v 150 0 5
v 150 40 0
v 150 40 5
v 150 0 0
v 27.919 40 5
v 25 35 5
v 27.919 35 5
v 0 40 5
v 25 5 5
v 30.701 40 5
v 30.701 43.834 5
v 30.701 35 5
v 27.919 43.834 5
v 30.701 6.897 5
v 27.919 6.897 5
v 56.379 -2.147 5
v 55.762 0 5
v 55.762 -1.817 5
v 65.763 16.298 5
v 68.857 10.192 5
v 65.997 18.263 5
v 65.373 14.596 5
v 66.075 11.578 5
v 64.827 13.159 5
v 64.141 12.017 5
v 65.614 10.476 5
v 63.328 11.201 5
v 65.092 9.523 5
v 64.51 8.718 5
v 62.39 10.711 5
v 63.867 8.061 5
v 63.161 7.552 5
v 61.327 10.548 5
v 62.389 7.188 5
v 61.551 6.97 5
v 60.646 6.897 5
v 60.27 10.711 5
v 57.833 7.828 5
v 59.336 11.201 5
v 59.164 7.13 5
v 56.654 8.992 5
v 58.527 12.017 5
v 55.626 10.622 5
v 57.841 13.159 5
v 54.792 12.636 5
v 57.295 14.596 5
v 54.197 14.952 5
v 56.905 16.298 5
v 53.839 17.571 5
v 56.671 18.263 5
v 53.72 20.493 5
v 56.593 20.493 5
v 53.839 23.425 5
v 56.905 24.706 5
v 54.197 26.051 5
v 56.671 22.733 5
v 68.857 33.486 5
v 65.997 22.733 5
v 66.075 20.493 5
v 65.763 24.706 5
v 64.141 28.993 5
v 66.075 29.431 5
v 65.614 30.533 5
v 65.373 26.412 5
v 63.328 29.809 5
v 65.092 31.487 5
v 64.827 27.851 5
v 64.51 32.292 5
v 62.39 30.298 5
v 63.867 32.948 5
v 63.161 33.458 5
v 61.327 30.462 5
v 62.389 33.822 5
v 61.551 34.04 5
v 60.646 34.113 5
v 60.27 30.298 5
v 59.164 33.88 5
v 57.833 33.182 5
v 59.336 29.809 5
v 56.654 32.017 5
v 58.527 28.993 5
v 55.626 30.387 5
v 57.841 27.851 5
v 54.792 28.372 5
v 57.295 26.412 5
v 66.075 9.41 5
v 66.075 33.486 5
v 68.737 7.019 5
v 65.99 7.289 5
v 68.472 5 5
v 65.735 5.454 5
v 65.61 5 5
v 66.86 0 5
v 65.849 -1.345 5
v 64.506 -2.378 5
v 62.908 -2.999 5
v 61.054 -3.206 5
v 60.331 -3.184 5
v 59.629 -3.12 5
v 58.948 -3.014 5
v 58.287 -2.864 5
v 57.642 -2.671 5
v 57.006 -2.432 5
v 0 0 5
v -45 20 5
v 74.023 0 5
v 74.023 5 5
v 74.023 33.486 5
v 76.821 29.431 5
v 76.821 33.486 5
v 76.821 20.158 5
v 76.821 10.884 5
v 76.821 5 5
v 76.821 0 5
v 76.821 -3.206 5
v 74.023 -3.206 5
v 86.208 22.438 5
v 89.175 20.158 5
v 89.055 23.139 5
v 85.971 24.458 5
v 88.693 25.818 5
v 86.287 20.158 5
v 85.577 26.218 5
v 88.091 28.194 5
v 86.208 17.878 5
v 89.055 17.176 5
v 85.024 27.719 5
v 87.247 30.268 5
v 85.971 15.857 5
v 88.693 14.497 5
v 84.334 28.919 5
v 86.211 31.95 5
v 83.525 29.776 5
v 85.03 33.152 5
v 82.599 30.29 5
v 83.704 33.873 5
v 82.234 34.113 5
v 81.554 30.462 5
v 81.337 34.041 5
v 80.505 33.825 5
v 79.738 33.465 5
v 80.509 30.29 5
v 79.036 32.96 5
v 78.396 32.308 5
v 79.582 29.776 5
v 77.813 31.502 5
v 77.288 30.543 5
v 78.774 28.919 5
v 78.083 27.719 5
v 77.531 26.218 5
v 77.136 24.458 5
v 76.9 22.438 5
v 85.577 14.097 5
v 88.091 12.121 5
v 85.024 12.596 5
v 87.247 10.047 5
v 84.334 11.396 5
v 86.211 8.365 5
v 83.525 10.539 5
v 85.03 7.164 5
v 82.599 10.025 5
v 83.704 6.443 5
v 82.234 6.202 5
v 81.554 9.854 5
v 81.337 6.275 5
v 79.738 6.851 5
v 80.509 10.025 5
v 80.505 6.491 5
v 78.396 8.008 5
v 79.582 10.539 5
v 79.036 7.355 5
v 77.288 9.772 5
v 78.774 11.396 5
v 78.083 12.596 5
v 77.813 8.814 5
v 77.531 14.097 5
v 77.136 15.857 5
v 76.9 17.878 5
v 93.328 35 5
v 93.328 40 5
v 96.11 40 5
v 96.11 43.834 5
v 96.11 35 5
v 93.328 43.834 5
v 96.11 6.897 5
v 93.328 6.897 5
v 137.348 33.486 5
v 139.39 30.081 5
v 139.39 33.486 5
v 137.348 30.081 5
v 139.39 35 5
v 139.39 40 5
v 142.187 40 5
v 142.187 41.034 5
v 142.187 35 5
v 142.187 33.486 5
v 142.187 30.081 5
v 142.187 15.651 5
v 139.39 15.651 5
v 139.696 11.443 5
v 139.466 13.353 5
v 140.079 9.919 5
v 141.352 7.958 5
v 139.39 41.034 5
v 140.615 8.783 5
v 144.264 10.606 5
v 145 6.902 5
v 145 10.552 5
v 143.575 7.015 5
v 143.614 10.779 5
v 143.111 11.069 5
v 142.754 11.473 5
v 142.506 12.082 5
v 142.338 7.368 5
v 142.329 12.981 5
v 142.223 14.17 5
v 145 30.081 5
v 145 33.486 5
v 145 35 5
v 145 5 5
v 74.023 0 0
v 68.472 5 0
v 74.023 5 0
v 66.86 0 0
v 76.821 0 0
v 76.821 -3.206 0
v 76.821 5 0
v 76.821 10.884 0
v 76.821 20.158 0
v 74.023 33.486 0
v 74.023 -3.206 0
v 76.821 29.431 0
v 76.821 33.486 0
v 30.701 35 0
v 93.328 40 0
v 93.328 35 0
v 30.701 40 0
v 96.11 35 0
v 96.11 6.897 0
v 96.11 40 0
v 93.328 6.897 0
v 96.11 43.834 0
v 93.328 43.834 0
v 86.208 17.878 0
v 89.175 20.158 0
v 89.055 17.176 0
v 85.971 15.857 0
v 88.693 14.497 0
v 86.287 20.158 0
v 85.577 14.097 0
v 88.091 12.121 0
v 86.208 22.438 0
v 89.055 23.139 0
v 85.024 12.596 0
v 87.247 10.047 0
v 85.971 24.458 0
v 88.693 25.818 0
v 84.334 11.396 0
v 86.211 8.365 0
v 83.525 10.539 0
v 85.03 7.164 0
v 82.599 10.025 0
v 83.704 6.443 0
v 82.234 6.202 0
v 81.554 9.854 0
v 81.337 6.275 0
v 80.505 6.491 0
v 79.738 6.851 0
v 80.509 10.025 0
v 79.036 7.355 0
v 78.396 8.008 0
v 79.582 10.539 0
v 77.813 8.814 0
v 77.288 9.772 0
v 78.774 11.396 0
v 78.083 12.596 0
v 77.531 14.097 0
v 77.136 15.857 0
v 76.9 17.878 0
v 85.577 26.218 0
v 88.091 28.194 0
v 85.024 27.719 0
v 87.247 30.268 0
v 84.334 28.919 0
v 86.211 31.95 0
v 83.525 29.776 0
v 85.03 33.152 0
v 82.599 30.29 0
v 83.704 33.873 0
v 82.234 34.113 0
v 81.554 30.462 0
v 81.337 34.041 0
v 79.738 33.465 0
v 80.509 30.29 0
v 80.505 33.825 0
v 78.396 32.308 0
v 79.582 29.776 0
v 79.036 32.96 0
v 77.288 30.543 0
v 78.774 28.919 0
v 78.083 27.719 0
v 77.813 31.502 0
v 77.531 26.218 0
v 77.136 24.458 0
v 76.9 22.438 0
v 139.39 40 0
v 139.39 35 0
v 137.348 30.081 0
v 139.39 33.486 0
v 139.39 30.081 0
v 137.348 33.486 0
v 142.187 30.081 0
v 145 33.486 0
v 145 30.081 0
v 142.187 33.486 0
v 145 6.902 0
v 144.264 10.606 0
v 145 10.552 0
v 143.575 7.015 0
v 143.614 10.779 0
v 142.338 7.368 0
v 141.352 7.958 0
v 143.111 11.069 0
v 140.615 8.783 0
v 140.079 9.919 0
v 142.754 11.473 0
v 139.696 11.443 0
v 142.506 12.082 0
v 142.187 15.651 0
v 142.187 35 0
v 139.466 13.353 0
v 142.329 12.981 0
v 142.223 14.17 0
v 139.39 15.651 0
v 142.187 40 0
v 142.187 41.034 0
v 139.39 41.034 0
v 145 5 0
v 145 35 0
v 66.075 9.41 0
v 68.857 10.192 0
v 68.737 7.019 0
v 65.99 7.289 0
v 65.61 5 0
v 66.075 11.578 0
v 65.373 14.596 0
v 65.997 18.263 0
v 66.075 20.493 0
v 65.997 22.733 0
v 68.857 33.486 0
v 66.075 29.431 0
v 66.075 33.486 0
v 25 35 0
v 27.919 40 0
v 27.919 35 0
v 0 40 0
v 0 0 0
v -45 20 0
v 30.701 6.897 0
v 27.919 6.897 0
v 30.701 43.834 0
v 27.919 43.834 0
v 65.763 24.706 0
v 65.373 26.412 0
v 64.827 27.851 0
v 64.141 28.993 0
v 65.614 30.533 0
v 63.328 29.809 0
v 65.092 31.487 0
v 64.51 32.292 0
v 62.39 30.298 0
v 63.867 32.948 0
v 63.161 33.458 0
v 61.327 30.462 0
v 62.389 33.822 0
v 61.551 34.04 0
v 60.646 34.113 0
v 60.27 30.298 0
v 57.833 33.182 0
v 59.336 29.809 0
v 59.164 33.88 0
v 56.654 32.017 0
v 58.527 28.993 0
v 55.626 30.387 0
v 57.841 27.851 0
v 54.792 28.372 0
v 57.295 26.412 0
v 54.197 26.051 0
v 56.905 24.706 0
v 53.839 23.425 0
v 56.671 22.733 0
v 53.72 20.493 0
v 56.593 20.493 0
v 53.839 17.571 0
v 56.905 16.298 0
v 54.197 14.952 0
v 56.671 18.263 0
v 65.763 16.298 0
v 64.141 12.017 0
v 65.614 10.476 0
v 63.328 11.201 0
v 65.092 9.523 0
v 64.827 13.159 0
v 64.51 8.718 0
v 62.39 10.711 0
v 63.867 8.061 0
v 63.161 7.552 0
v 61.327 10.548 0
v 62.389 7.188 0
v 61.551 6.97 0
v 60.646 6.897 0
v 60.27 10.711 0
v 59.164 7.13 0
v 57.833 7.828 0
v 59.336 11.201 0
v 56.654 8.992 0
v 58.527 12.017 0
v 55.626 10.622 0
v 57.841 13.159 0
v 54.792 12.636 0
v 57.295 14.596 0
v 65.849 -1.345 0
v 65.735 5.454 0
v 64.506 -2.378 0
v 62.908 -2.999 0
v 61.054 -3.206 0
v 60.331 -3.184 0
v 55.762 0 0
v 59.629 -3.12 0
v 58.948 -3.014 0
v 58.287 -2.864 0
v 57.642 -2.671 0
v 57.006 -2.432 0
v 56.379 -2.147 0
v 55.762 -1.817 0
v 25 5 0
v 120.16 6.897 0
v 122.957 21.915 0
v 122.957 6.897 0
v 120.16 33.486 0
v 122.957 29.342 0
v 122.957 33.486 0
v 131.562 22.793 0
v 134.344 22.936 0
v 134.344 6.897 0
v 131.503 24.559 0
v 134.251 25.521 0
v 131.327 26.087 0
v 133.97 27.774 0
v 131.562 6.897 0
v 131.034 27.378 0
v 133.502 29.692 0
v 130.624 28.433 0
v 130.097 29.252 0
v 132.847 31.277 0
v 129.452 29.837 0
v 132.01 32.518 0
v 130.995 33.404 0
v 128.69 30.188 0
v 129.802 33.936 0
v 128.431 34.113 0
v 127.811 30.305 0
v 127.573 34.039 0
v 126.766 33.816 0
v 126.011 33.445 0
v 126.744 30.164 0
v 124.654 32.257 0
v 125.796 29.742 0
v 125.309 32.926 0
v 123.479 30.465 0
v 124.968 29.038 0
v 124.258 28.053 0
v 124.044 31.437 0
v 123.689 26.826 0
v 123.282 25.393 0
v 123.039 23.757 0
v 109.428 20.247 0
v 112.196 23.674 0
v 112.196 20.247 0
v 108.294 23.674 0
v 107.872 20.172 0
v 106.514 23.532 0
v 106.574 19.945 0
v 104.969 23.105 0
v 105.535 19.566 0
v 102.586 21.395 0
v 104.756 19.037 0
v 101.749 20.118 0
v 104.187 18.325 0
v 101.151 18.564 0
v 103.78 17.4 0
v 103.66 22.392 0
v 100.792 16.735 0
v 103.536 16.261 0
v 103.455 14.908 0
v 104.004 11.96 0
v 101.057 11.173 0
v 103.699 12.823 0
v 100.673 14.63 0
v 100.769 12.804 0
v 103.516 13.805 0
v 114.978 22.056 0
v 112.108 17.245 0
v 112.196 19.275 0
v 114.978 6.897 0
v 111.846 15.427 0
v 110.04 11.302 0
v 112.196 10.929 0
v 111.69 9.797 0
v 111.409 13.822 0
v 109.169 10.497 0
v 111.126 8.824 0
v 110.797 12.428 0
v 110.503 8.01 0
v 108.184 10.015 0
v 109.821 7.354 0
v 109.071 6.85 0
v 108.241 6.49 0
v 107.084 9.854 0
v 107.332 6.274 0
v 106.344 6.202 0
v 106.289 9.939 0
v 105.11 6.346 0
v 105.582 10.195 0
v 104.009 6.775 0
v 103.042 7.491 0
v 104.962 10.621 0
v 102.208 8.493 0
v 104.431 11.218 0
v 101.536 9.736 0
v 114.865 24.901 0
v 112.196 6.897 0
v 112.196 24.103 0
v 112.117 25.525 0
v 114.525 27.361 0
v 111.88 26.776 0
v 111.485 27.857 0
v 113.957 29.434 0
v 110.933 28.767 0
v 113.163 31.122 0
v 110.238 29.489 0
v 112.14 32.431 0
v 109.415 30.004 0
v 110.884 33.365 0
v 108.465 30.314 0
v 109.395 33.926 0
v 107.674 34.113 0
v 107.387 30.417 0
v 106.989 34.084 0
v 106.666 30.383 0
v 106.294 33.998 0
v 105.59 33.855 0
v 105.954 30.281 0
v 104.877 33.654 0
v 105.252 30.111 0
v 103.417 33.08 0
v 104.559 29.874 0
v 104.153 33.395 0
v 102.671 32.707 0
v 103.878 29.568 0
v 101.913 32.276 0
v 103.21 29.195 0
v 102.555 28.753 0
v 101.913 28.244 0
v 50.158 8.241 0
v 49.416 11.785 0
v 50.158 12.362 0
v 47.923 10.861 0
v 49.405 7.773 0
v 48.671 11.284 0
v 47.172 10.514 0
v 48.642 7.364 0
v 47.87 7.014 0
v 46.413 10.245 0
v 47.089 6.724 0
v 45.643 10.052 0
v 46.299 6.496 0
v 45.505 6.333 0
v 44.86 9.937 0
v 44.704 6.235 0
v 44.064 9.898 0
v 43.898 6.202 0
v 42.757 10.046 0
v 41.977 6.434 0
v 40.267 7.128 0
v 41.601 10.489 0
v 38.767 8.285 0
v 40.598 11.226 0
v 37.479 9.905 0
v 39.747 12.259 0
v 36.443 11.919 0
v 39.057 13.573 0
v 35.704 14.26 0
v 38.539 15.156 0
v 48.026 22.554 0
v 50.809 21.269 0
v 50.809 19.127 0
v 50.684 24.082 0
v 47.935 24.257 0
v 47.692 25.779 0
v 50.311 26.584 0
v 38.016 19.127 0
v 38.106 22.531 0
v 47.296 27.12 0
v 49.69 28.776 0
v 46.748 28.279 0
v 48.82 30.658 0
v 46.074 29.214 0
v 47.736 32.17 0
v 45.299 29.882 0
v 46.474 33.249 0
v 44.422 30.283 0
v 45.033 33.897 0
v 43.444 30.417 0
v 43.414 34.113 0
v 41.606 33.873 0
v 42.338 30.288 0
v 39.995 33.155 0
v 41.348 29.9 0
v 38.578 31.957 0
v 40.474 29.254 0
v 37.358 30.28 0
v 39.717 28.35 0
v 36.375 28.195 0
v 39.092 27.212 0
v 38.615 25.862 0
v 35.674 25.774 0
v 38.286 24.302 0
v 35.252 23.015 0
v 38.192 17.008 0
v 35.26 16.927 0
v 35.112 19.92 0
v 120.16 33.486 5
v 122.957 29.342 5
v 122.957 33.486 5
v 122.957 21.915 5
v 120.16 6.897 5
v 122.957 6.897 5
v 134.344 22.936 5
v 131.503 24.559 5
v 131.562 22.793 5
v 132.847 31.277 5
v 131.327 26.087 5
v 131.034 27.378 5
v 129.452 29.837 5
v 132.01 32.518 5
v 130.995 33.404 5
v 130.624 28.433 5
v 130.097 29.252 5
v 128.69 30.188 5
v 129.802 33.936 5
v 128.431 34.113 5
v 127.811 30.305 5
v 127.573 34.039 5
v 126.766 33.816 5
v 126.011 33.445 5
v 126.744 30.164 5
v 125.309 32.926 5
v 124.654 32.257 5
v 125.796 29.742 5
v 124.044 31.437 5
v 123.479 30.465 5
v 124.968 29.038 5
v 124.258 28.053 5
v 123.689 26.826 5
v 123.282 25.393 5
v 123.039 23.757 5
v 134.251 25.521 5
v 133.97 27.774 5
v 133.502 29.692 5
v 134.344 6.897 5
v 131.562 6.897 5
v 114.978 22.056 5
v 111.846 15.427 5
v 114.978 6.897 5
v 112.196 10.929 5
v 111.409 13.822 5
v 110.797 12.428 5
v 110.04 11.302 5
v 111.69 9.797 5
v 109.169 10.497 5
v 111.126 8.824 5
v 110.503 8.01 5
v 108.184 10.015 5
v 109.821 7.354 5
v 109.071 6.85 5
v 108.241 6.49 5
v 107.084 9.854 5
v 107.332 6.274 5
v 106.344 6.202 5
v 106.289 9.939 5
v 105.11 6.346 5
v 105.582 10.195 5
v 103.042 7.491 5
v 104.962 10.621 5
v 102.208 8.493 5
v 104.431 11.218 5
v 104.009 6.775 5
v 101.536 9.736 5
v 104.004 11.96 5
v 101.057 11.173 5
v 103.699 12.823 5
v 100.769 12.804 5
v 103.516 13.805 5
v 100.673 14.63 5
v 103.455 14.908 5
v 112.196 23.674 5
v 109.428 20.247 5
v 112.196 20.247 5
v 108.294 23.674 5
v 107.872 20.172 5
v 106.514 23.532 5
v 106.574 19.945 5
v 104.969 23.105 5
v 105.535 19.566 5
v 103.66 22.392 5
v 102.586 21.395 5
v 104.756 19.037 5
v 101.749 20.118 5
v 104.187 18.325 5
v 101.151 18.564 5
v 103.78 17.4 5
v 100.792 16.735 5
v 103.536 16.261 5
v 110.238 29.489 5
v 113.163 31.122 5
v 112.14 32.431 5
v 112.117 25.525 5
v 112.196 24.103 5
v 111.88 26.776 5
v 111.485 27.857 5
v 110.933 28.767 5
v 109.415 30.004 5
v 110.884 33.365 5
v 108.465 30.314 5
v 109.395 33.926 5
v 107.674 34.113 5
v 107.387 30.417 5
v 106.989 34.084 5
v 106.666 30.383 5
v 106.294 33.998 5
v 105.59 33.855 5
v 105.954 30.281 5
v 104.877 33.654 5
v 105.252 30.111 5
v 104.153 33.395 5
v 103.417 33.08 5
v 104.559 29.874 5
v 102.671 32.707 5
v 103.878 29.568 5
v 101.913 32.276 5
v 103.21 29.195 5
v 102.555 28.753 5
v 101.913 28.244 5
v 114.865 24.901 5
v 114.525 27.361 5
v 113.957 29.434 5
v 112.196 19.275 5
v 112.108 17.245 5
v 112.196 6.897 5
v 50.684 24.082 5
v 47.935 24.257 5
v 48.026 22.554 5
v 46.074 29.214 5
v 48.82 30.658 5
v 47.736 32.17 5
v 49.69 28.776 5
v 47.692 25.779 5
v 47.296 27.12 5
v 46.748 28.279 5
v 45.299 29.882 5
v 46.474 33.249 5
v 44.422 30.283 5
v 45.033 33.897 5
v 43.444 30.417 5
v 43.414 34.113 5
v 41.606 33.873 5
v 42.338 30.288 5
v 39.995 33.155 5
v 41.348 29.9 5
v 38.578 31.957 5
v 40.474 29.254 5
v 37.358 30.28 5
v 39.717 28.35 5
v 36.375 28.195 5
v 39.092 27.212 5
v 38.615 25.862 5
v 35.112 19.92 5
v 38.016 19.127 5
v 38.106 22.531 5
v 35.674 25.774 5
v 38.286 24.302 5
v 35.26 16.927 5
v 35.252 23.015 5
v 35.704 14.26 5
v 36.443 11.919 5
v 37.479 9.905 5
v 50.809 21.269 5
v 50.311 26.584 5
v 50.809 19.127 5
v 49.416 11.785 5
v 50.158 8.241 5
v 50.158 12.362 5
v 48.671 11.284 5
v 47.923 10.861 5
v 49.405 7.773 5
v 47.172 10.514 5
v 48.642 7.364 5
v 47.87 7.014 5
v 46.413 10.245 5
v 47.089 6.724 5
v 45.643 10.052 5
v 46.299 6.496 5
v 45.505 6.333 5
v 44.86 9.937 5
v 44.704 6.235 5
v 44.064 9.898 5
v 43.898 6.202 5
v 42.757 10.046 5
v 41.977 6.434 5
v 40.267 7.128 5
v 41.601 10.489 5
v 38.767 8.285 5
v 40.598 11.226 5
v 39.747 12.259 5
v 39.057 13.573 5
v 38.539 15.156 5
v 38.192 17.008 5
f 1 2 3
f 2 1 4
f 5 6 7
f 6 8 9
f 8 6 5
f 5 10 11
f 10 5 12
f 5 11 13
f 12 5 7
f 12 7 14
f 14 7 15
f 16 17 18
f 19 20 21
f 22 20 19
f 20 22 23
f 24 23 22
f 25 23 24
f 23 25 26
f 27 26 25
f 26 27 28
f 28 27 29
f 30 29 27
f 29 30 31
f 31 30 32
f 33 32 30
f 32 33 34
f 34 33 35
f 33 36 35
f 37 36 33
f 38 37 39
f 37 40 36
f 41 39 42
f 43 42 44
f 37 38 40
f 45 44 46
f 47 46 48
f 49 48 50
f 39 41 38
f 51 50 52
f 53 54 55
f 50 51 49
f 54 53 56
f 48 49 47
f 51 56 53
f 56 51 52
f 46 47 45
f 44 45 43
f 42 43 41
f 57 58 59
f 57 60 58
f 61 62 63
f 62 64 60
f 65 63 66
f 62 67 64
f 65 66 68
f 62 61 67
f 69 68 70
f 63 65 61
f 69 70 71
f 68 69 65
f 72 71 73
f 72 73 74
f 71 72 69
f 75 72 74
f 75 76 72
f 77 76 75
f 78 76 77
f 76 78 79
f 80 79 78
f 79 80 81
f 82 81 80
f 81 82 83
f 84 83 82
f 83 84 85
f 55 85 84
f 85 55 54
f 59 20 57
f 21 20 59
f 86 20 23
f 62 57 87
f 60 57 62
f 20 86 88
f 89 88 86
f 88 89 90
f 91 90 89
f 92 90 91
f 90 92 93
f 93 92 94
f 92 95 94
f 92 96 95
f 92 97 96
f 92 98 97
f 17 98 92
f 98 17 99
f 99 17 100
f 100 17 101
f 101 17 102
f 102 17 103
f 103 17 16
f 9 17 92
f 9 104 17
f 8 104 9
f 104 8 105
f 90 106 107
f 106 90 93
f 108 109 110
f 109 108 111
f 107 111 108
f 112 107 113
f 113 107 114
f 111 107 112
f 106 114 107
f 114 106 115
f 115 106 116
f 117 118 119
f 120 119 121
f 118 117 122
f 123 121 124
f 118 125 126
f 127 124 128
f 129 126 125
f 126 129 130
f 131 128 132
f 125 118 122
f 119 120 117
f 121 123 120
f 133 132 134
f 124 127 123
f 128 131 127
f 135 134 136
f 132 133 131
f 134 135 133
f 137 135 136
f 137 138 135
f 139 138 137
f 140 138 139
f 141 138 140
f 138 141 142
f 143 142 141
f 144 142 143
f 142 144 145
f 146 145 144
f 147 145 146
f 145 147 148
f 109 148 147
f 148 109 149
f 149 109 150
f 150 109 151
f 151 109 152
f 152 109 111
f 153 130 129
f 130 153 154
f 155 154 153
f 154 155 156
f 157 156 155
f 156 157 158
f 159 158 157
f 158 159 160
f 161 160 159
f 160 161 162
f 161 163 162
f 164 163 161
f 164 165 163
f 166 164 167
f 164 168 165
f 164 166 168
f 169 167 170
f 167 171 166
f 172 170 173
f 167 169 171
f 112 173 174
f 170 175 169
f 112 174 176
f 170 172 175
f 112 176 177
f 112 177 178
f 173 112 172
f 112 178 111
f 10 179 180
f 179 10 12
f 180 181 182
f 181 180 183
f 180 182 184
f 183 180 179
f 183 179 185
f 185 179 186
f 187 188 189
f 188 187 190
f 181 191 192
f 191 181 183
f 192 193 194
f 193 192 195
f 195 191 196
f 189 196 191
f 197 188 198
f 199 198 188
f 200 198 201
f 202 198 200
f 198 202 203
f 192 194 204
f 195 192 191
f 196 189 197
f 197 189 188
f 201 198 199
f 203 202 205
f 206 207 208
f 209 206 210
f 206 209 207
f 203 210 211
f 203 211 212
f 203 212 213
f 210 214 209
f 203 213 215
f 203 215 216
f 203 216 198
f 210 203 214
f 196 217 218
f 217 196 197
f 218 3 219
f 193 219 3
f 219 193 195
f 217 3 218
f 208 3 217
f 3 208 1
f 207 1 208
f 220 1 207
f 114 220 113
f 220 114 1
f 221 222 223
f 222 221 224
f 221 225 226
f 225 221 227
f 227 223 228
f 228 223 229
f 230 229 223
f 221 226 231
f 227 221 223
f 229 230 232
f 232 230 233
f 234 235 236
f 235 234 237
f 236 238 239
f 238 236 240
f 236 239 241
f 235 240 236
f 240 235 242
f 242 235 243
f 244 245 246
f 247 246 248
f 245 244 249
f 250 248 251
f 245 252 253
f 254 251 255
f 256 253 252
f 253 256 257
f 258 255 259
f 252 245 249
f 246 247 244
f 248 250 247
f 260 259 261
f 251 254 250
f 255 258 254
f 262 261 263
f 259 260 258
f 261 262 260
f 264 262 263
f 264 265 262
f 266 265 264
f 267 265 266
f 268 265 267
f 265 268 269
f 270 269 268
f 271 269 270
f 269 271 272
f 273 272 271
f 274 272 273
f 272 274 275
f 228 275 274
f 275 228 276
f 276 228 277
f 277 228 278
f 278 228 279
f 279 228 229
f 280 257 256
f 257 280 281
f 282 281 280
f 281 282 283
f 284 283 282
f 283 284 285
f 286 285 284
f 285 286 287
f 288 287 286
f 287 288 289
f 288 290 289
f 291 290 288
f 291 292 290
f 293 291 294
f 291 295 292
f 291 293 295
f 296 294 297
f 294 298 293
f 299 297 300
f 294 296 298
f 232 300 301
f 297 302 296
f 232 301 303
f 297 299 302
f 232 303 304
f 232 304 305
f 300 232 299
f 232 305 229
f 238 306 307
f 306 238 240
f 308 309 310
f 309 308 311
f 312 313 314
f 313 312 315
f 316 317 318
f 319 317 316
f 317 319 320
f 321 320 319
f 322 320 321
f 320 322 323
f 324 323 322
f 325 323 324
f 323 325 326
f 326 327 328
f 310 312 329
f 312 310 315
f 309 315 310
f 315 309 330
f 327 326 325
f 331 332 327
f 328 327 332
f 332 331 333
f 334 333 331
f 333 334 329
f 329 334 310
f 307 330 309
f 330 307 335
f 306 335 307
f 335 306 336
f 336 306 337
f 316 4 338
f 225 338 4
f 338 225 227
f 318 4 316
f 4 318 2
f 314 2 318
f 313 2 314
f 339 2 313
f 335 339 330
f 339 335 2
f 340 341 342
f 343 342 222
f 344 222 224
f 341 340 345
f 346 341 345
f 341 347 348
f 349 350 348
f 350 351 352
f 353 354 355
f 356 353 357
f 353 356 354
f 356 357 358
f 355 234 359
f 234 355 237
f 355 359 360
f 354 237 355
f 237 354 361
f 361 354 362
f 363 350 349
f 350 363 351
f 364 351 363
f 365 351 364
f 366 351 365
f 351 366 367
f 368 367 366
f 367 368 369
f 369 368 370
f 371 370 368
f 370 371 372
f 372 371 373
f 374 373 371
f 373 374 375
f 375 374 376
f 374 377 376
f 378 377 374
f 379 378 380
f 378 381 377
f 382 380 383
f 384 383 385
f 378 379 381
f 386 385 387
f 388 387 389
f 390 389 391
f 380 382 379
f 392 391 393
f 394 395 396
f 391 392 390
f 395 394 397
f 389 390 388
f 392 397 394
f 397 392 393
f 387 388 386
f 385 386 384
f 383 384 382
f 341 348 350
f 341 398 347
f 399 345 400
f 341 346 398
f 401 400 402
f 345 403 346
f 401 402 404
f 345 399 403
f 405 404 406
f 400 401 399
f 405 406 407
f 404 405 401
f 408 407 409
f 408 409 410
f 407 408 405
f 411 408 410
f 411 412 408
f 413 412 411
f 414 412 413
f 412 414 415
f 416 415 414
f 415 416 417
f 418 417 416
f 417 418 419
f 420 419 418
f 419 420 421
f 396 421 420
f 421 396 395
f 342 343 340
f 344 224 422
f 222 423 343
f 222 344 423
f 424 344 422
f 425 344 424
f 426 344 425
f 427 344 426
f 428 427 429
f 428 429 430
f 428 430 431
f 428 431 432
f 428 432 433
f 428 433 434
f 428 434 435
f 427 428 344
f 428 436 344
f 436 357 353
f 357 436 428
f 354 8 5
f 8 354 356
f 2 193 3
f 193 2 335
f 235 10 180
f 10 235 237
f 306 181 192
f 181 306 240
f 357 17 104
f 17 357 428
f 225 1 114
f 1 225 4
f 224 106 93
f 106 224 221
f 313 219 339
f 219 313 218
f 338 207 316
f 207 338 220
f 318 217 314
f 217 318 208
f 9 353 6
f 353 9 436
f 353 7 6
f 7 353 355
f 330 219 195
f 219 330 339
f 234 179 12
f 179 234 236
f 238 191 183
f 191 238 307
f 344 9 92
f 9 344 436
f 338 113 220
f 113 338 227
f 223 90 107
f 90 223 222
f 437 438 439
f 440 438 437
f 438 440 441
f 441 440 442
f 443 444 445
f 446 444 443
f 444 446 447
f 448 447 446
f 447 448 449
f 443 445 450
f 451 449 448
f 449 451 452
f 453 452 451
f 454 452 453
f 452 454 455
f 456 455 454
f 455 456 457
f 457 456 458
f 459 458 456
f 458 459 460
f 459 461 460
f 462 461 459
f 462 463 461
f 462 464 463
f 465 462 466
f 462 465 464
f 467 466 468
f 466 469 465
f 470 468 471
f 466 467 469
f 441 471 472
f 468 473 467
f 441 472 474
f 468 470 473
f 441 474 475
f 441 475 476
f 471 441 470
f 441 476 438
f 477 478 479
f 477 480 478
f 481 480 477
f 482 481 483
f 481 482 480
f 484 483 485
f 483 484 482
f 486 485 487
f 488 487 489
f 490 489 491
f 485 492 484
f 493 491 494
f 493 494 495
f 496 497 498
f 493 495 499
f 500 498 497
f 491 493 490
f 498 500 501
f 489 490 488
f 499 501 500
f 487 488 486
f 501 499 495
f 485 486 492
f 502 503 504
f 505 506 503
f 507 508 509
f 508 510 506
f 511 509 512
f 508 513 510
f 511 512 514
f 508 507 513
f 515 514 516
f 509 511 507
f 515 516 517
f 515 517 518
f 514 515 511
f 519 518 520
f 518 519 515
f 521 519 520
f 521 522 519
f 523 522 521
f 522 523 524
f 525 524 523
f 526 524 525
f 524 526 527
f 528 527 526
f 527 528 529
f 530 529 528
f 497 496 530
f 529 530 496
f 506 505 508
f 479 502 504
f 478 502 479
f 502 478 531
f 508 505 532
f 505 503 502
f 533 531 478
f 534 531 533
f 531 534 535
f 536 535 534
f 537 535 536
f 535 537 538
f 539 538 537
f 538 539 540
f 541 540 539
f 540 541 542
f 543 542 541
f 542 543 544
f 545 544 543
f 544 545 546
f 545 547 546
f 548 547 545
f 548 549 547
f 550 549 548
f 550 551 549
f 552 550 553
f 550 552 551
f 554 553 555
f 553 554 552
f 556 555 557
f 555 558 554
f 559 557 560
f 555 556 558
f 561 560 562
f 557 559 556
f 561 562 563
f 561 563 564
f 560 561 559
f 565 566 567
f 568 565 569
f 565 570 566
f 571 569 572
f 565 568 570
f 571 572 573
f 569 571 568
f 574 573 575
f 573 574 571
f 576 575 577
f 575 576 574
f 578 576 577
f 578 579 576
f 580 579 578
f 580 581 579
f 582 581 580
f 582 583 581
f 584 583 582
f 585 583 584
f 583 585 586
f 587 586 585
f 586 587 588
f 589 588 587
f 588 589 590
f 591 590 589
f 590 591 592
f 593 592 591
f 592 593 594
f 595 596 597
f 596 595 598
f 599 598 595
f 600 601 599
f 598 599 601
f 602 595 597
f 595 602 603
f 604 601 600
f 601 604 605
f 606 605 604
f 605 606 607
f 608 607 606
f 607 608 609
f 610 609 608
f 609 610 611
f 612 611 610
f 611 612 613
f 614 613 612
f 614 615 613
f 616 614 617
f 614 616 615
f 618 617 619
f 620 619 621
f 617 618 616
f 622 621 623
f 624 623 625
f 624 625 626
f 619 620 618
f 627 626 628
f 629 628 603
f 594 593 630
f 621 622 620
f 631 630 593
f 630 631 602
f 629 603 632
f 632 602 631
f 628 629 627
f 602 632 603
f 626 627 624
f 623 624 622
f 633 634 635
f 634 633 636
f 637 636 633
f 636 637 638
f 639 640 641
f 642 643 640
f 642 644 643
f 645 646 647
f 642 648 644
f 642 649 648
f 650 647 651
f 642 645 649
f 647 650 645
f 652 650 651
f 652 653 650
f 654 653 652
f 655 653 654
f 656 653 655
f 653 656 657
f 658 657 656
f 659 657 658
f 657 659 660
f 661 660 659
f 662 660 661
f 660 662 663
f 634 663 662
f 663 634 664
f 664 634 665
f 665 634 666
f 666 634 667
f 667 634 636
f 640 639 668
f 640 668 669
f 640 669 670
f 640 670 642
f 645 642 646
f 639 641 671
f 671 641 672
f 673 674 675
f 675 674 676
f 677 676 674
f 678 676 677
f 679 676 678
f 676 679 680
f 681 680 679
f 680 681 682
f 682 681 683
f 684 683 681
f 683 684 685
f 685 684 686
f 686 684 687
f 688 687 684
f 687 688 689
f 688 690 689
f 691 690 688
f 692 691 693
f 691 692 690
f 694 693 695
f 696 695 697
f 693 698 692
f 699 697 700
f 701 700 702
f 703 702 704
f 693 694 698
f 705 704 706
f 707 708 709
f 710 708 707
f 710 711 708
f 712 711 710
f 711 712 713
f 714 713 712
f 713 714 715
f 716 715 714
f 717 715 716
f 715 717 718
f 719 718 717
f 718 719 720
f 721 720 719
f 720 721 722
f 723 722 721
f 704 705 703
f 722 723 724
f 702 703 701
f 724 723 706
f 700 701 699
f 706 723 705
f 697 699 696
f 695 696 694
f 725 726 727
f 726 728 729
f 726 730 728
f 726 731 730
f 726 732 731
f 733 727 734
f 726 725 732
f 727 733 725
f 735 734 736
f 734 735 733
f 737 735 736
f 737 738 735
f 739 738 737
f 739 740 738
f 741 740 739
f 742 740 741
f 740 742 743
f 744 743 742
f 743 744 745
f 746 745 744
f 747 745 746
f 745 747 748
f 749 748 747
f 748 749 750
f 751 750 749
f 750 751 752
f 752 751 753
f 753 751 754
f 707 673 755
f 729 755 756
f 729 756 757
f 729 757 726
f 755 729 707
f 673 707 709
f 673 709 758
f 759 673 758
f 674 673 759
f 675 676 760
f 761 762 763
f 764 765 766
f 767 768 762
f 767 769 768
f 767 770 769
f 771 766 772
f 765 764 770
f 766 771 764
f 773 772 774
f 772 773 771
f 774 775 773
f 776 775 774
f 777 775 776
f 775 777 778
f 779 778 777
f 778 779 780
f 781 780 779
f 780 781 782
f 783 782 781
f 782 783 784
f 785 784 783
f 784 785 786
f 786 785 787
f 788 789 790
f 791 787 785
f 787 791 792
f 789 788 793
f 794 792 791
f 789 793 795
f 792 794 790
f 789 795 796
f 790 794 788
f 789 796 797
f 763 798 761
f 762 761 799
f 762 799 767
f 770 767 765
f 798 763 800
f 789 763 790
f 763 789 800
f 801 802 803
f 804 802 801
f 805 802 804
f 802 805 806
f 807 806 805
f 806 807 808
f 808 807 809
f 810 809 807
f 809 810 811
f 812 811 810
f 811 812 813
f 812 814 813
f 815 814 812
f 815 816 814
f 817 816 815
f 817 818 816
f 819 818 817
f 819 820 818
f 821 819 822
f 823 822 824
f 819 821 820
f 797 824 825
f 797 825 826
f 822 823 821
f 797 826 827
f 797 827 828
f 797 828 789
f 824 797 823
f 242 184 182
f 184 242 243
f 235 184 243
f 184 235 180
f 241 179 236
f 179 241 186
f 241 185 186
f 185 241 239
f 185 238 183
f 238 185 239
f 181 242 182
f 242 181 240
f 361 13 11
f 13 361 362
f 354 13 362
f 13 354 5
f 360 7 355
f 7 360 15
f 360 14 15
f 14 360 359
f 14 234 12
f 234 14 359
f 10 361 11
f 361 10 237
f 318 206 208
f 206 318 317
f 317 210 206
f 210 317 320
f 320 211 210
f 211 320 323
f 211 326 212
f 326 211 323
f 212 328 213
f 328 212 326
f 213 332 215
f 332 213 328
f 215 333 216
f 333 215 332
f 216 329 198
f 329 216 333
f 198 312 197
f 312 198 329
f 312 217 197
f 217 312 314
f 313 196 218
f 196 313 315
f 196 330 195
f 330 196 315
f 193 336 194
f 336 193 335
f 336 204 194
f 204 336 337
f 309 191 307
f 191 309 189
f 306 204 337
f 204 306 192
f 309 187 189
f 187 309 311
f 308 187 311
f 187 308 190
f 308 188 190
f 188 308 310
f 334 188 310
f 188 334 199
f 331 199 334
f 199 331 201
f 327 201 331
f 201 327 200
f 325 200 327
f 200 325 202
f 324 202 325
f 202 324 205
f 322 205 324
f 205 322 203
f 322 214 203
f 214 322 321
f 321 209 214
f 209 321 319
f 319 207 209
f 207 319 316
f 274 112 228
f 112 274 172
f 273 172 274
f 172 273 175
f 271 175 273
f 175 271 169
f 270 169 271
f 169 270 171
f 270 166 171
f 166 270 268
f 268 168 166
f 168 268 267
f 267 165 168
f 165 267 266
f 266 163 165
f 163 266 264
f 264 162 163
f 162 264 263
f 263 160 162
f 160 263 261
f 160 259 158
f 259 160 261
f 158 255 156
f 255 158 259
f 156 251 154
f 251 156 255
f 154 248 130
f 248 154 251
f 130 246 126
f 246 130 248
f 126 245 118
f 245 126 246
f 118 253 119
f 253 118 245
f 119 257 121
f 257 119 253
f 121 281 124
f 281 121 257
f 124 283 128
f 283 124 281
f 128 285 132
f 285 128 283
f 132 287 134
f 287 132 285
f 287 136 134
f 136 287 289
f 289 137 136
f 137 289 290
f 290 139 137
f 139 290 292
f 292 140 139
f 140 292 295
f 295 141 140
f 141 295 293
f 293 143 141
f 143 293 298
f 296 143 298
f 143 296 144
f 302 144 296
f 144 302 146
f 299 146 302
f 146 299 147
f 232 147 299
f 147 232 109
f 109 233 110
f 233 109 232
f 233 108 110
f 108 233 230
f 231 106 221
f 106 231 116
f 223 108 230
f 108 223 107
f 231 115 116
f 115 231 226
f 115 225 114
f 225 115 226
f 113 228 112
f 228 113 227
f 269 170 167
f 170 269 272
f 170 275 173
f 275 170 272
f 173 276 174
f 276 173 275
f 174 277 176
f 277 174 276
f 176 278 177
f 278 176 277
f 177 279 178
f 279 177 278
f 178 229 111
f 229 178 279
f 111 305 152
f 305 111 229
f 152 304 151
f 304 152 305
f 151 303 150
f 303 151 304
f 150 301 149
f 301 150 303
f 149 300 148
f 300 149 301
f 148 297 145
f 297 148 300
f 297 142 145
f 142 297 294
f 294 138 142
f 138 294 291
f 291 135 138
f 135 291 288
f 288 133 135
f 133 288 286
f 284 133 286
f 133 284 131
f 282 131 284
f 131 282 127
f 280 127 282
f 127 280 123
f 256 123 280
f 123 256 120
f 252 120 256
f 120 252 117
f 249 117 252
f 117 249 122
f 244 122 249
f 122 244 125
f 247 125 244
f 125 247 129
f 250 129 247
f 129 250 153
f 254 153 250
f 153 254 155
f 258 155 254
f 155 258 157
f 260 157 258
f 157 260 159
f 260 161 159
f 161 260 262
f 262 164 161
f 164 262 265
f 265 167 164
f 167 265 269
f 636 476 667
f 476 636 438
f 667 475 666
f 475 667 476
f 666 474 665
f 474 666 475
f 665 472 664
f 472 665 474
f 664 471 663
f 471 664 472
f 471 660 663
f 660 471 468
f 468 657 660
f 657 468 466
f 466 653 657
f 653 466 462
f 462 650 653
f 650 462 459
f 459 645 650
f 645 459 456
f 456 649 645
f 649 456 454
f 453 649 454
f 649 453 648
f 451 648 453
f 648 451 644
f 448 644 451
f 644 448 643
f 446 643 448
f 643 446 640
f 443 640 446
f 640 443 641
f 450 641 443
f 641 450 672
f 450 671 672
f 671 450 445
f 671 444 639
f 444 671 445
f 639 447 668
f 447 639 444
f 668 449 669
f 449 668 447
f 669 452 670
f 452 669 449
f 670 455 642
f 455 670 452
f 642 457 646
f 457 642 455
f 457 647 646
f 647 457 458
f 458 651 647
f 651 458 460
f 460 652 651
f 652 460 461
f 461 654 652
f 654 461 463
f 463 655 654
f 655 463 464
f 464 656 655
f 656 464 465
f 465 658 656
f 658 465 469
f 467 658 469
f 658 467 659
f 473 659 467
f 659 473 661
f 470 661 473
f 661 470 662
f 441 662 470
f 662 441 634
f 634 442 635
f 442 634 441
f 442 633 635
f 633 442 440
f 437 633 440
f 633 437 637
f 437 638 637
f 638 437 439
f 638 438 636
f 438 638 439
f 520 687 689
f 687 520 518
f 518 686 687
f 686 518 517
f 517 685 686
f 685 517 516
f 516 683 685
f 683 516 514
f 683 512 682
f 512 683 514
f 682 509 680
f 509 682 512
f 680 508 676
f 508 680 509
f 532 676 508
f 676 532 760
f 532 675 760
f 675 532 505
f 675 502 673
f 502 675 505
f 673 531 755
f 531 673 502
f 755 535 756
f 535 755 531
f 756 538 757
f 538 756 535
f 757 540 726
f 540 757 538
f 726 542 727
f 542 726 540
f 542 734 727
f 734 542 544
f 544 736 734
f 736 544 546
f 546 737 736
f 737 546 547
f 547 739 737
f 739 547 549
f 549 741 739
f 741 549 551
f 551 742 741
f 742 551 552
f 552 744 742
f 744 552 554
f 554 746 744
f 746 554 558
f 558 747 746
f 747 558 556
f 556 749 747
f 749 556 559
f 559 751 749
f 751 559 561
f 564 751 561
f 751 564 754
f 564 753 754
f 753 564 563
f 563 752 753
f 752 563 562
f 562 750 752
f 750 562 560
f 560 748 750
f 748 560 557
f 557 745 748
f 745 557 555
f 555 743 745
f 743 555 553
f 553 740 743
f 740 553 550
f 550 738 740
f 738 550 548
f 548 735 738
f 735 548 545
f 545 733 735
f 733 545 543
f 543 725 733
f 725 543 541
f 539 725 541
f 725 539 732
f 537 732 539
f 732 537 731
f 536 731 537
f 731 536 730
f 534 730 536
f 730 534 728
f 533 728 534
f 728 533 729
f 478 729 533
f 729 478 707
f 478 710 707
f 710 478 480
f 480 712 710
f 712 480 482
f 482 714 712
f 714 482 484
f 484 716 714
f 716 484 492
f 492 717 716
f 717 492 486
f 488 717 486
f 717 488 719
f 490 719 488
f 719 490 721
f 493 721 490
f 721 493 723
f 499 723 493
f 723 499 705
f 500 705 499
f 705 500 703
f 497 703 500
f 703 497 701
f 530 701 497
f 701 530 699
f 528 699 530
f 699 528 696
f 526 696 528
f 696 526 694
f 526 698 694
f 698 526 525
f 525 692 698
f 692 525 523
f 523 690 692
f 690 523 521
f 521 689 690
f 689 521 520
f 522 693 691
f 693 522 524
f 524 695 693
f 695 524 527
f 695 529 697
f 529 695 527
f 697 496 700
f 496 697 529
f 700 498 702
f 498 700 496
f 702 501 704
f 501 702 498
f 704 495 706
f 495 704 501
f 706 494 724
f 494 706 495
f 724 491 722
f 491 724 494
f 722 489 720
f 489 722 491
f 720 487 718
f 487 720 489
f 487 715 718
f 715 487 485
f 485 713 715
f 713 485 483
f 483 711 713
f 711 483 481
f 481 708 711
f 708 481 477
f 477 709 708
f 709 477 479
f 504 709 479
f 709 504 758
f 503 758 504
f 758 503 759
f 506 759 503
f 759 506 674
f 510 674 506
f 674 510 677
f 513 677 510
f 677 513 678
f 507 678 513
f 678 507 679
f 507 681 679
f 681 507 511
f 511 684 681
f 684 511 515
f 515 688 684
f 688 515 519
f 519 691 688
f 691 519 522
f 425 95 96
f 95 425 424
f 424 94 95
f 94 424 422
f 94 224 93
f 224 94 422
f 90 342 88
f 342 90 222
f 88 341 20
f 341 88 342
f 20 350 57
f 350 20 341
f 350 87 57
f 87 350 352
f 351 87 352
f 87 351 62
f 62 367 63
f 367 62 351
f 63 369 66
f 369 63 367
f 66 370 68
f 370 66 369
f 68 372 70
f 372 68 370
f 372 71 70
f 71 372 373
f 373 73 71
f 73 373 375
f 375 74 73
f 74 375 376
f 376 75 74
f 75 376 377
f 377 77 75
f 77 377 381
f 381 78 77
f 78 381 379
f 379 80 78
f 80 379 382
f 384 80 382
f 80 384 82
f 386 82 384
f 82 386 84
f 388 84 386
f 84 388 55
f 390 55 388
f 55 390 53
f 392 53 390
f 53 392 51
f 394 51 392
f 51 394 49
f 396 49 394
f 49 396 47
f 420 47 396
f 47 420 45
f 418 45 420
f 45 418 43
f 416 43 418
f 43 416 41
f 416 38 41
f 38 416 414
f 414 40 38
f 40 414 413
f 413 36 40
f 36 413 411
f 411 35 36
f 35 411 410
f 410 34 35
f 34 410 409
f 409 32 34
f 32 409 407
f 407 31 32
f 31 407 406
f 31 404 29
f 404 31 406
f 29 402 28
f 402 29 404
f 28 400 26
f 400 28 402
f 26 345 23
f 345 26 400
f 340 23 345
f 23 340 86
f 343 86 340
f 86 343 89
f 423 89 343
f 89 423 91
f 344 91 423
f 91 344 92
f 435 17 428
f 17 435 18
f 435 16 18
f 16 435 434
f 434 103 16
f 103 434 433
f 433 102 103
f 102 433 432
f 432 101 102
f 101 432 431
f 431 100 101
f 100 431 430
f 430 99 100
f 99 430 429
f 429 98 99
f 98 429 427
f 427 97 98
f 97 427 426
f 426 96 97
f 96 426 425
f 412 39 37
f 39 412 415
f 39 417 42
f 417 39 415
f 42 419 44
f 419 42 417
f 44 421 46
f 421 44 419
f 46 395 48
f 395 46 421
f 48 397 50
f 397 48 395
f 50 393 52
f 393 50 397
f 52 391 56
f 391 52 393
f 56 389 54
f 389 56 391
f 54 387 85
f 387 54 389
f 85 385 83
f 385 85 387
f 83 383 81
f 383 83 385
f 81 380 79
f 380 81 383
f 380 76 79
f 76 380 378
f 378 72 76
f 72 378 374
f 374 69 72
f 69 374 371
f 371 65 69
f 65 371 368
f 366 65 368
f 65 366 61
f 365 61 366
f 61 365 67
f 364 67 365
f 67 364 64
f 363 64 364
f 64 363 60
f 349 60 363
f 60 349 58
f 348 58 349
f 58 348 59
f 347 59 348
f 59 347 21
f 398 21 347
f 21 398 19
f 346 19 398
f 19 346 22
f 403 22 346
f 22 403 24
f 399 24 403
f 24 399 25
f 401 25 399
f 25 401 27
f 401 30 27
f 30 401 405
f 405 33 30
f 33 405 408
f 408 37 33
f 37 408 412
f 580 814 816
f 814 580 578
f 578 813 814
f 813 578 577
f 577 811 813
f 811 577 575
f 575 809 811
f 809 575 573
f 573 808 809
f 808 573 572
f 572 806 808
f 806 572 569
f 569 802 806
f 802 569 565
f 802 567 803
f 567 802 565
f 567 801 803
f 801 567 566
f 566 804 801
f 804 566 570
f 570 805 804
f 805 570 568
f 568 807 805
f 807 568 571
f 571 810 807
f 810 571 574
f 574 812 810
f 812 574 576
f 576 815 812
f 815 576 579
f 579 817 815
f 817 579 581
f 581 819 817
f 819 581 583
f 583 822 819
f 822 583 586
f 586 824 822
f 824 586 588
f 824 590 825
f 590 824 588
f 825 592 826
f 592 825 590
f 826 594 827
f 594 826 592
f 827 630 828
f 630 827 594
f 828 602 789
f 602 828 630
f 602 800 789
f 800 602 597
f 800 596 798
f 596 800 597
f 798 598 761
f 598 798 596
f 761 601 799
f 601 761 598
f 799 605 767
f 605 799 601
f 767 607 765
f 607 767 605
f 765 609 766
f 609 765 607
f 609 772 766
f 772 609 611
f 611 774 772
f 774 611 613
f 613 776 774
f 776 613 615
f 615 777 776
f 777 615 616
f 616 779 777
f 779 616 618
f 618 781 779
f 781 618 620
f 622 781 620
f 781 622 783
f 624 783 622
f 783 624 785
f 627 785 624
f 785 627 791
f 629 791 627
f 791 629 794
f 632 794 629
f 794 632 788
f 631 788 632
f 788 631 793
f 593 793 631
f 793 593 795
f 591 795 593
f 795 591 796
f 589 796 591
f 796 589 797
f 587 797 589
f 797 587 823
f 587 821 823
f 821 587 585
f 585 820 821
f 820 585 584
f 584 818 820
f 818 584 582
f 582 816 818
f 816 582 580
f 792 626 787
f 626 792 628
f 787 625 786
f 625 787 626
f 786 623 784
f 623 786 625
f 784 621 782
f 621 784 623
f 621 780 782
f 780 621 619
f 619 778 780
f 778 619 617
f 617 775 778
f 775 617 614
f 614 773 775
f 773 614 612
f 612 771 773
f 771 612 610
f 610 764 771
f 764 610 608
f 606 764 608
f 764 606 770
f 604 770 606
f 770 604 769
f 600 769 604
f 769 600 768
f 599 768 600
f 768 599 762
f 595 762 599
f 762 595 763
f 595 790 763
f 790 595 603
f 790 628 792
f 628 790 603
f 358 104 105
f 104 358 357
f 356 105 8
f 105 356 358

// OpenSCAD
// Text to display on the label.
label_text = "legplant";
// Length of the sign.
sign_l = 150;
// Width of the sign.
sign_w = 40;
// Overall thickness.
thickness = 5;
// Font to use.  See www.google.com/fonts for a full list of available fonts.
font = "Yellowtail";

module label(lbl) {
    tw = len(lbl) * 15; // a guess at how wide the text will end up
    th = sign_w-5;
    difference() {
        cube([sign_l, sign_w, thickness]);
        translate([sign_l-tw-5, 5, -.1]) cube([tw, sign_w-10, thickness+.2]);
    }
    translate([sign_l-tw-5, sign_w/2, 0]) {
        linear_extrude(thickness) {
            resize([tw, 0]) {
                text(lbl, size=th, valign="center", font=font);
            }
        }
    }
    linear_extrude(thickness) polygon(points=[[0, 0], [0, sign_w], [-45, sign_w/2]]);
}

label(label_text);
